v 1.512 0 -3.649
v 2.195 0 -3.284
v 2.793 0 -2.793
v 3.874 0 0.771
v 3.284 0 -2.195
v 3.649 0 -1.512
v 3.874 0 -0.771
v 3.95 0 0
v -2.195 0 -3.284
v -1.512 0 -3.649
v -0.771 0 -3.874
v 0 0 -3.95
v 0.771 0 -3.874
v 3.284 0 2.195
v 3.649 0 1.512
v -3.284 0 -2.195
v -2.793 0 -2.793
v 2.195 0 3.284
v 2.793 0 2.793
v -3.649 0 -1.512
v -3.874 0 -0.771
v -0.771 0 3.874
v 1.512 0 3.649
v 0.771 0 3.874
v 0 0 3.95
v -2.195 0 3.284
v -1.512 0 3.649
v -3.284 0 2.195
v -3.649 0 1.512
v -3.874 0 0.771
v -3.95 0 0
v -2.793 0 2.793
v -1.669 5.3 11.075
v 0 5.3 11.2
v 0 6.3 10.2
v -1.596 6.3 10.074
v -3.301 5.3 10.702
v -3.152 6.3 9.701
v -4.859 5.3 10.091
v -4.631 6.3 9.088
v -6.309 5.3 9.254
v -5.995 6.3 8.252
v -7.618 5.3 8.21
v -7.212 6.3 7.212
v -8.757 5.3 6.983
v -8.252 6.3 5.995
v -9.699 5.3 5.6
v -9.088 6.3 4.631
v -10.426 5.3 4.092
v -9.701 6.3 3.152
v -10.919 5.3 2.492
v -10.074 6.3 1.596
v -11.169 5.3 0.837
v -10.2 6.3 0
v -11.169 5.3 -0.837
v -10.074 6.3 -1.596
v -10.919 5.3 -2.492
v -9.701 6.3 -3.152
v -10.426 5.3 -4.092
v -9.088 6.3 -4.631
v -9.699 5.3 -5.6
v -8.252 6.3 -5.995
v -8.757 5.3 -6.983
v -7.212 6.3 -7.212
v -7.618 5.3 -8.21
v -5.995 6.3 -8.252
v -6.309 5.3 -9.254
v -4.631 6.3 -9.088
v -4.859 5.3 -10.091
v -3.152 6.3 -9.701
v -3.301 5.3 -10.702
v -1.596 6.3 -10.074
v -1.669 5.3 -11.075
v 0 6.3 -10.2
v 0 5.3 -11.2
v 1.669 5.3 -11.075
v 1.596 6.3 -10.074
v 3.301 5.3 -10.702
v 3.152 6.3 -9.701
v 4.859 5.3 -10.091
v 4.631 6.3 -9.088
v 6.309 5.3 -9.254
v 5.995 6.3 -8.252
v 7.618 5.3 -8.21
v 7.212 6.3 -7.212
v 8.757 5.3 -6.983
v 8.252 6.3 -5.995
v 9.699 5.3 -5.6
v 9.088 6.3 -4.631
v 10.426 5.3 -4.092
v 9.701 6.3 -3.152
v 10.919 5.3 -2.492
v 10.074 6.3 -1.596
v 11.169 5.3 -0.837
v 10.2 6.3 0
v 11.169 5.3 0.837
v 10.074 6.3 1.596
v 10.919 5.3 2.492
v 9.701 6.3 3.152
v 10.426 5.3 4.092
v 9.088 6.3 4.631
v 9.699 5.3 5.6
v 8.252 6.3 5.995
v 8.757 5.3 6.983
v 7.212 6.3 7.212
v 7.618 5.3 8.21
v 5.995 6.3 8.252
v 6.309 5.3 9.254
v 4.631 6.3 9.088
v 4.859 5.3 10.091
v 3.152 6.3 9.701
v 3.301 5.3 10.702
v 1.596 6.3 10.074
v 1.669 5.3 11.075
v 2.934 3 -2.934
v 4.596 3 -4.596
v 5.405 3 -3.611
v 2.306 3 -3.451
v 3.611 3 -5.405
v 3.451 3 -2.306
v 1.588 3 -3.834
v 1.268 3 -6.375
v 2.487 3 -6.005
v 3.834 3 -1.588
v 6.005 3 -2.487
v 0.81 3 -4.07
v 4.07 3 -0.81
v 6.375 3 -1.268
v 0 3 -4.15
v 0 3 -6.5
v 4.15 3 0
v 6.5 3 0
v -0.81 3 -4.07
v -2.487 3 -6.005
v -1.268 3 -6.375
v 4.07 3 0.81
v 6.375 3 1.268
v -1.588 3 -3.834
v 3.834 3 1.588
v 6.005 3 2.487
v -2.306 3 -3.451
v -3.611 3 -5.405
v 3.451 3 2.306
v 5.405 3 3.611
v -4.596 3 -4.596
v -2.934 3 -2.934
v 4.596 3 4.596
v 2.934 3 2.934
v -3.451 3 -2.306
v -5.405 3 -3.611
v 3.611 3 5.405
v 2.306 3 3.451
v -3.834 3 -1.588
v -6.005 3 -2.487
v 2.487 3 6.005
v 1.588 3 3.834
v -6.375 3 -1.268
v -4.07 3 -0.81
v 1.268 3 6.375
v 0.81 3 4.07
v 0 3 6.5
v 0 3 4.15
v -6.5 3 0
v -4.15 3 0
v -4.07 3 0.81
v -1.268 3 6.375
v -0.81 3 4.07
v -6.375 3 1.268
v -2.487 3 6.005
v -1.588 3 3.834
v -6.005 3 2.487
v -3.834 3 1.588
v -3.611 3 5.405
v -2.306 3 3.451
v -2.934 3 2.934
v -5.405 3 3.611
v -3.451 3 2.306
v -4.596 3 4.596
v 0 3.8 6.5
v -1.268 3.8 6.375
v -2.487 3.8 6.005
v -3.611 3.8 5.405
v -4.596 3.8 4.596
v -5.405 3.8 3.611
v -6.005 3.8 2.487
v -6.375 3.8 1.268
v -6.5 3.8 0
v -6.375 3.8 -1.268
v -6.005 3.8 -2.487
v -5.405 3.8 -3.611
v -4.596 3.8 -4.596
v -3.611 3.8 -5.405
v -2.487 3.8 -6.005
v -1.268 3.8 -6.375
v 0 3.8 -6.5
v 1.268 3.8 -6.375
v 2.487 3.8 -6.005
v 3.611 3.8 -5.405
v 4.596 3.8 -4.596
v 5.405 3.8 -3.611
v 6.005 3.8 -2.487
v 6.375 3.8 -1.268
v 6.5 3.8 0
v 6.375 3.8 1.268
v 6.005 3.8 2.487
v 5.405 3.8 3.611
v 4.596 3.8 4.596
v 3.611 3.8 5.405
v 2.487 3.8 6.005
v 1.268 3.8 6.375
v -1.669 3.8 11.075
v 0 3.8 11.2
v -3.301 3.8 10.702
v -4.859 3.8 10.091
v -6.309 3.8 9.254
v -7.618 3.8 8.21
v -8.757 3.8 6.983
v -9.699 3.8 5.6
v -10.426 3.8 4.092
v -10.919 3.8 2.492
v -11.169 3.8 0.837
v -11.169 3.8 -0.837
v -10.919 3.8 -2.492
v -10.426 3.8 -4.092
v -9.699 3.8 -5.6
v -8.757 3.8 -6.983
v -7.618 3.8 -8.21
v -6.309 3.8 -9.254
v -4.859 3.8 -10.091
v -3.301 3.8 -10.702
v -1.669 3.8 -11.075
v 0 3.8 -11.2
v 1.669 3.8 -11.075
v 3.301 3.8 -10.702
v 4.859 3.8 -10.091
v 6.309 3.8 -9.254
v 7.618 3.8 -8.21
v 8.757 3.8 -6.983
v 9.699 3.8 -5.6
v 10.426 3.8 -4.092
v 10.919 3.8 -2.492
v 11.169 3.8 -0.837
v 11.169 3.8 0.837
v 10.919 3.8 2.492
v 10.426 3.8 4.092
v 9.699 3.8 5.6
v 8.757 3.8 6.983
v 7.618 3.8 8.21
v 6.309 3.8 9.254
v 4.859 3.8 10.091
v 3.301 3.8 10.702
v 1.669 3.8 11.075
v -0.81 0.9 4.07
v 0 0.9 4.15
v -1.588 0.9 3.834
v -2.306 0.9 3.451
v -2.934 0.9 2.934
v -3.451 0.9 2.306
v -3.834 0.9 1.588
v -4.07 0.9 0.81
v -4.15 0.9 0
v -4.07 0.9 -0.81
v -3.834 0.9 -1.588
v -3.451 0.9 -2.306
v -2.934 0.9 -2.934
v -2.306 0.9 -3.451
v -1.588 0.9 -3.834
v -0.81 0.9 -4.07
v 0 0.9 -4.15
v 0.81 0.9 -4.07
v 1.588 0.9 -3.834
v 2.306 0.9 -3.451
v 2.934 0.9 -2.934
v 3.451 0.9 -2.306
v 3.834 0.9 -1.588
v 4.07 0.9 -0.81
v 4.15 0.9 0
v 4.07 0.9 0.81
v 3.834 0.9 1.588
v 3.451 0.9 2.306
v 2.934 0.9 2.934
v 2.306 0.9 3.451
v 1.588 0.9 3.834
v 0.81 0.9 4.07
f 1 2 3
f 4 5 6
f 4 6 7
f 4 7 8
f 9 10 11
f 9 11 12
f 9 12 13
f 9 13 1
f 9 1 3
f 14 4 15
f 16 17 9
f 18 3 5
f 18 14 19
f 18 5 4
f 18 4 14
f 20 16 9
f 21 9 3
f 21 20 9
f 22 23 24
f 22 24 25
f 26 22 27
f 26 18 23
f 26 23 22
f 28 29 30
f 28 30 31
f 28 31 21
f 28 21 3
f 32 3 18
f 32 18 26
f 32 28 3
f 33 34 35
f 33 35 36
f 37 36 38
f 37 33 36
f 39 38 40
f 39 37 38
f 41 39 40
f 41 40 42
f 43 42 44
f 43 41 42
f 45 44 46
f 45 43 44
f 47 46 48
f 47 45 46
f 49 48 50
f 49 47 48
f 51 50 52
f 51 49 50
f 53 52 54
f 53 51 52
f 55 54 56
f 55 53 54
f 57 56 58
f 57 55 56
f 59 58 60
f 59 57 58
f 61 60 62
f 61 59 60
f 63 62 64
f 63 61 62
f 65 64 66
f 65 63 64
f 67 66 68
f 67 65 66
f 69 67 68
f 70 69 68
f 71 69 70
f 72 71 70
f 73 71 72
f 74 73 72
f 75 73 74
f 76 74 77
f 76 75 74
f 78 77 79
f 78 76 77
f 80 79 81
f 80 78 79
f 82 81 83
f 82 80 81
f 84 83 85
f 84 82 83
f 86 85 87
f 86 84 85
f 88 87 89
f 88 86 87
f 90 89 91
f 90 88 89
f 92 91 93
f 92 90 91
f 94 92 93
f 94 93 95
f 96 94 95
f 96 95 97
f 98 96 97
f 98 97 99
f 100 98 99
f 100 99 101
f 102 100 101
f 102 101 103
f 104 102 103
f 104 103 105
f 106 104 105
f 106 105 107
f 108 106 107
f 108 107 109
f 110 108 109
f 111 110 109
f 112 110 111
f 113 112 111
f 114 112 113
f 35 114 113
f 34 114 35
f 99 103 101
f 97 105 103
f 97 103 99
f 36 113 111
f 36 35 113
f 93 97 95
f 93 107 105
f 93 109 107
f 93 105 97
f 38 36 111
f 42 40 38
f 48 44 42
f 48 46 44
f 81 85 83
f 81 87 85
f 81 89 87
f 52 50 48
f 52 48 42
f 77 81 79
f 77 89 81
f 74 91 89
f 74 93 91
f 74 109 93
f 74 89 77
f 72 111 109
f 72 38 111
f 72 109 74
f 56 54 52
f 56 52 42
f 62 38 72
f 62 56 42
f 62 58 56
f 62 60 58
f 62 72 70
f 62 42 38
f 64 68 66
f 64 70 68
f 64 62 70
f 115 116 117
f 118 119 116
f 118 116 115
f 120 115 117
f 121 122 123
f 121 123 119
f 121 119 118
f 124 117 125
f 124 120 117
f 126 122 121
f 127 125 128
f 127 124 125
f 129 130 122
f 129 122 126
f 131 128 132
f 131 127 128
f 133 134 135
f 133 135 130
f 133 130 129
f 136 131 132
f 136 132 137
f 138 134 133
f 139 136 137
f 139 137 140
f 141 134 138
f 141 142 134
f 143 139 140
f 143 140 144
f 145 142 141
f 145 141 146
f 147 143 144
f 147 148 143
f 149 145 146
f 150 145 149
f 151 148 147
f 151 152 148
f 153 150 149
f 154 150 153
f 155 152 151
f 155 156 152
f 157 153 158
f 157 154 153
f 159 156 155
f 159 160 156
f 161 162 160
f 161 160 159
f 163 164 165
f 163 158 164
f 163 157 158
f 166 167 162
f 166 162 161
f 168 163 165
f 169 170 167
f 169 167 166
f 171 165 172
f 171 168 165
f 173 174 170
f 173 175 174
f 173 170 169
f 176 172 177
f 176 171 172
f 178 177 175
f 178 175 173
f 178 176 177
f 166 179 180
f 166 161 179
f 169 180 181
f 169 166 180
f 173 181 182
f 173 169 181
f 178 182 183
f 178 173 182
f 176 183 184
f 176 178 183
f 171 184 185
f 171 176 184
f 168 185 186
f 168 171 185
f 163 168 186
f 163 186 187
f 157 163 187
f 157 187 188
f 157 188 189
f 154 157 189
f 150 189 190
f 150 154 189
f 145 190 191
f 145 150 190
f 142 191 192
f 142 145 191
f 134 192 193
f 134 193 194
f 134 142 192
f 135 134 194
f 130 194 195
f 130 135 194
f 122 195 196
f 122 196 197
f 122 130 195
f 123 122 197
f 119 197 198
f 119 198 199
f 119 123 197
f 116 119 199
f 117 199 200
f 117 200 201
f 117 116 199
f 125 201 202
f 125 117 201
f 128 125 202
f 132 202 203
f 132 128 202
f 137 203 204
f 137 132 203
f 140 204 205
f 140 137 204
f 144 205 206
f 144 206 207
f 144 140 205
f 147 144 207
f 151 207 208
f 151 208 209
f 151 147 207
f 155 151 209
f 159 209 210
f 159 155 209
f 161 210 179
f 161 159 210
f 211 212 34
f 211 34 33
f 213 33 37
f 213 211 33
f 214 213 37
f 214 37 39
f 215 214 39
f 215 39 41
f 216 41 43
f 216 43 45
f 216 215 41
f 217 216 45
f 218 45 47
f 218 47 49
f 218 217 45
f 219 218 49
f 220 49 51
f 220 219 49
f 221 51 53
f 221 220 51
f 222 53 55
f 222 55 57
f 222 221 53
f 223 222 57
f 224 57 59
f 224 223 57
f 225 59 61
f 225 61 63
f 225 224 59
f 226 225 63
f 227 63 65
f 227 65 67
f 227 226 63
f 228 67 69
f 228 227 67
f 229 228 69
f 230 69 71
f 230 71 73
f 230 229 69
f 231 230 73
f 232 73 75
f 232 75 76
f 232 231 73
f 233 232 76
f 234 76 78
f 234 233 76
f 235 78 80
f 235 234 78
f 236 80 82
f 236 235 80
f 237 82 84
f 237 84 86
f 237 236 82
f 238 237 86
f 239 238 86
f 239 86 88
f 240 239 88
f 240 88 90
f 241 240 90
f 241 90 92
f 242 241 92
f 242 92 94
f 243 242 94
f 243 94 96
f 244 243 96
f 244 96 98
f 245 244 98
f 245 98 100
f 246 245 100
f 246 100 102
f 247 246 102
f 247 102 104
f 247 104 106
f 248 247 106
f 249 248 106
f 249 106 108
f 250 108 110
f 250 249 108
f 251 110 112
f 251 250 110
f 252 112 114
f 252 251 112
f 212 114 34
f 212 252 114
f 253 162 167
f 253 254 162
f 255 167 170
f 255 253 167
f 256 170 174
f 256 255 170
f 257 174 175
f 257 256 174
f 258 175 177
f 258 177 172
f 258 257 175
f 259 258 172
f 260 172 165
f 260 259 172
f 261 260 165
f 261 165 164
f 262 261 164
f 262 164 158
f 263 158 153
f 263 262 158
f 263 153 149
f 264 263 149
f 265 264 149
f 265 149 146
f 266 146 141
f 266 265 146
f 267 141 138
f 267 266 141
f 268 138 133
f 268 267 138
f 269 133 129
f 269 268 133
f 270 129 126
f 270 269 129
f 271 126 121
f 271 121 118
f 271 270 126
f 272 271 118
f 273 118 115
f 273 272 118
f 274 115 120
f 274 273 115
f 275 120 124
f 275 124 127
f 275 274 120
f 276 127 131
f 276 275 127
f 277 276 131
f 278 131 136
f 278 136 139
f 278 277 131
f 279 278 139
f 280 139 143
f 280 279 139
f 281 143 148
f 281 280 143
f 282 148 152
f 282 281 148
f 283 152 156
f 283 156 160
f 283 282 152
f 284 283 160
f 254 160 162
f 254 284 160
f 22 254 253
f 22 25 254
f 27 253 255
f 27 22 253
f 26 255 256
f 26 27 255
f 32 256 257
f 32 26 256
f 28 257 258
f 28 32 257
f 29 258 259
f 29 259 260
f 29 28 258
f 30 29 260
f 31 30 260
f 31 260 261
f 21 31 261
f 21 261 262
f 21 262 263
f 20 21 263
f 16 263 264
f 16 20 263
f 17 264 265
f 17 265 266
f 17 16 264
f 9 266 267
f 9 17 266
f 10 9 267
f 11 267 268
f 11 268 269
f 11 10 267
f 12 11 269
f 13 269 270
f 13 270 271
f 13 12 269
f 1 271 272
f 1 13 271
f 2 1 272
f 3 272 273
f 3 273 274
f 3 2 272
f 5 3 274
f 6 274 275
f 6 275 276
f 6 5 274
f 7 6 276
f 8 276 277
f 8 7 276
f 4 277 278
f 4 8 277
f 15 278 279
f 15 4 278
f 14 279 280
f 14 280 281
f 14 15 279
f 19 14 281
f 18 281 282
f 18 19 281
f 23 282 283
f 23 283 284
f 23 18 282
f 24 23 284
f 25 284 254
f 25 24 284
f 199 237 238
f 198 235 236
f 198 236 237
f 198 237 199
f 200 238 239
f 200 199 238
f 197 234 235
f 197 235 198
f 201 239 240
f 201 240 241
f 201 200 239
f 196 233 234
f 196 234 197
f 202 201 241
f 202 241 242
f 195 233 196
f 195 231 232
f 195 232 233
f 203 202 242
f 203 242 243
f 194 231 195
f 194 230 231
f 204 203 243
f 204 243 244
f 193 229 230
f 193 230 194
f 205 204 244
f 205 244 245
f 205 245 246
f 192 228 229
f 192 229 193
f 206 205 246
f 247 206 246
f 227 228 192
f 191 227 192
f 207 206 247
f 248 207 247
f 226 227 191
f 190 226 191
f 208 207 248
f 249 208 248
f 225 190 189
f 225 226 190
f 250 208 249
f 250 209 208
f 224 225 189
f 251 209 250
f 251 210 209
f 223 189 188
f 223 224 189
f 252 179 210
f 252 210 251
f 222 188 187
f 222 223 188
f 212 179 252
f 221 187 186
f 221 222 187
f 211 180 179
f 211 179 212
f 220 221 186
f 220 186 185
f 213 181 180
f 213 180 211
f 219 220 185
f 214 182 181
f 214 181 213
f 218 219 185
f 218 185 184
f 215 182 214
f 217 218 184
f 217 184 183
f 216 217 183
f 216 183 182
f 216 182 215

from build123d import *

# Parameters (mm, degrees)
F2_SIZE = 1


with BuildPart() as f1:
    # F0 (on Right) → F1 (revolve)
    with BuildSketch(Plane.YZ):
        Polygon((0, 0), (6.3, 0), (6.3, 11.2), (3.8, 11.2), (3.8, 6.5), (3, 6.5), (3, 4.15), (0.9, 4.15), (0, 3.95), align=None)
    revolve(axis=Axis((0, 3.15, 0), (0, -1, 0)))

    # F2
    f2_edges = [f1.edges().sort_by_distance(p)[0] for p in [
        (0, 6.3, -11.2),
    ]]
    chamfer(f2_edges, length=F2_SIZE)


solid = f1.part
